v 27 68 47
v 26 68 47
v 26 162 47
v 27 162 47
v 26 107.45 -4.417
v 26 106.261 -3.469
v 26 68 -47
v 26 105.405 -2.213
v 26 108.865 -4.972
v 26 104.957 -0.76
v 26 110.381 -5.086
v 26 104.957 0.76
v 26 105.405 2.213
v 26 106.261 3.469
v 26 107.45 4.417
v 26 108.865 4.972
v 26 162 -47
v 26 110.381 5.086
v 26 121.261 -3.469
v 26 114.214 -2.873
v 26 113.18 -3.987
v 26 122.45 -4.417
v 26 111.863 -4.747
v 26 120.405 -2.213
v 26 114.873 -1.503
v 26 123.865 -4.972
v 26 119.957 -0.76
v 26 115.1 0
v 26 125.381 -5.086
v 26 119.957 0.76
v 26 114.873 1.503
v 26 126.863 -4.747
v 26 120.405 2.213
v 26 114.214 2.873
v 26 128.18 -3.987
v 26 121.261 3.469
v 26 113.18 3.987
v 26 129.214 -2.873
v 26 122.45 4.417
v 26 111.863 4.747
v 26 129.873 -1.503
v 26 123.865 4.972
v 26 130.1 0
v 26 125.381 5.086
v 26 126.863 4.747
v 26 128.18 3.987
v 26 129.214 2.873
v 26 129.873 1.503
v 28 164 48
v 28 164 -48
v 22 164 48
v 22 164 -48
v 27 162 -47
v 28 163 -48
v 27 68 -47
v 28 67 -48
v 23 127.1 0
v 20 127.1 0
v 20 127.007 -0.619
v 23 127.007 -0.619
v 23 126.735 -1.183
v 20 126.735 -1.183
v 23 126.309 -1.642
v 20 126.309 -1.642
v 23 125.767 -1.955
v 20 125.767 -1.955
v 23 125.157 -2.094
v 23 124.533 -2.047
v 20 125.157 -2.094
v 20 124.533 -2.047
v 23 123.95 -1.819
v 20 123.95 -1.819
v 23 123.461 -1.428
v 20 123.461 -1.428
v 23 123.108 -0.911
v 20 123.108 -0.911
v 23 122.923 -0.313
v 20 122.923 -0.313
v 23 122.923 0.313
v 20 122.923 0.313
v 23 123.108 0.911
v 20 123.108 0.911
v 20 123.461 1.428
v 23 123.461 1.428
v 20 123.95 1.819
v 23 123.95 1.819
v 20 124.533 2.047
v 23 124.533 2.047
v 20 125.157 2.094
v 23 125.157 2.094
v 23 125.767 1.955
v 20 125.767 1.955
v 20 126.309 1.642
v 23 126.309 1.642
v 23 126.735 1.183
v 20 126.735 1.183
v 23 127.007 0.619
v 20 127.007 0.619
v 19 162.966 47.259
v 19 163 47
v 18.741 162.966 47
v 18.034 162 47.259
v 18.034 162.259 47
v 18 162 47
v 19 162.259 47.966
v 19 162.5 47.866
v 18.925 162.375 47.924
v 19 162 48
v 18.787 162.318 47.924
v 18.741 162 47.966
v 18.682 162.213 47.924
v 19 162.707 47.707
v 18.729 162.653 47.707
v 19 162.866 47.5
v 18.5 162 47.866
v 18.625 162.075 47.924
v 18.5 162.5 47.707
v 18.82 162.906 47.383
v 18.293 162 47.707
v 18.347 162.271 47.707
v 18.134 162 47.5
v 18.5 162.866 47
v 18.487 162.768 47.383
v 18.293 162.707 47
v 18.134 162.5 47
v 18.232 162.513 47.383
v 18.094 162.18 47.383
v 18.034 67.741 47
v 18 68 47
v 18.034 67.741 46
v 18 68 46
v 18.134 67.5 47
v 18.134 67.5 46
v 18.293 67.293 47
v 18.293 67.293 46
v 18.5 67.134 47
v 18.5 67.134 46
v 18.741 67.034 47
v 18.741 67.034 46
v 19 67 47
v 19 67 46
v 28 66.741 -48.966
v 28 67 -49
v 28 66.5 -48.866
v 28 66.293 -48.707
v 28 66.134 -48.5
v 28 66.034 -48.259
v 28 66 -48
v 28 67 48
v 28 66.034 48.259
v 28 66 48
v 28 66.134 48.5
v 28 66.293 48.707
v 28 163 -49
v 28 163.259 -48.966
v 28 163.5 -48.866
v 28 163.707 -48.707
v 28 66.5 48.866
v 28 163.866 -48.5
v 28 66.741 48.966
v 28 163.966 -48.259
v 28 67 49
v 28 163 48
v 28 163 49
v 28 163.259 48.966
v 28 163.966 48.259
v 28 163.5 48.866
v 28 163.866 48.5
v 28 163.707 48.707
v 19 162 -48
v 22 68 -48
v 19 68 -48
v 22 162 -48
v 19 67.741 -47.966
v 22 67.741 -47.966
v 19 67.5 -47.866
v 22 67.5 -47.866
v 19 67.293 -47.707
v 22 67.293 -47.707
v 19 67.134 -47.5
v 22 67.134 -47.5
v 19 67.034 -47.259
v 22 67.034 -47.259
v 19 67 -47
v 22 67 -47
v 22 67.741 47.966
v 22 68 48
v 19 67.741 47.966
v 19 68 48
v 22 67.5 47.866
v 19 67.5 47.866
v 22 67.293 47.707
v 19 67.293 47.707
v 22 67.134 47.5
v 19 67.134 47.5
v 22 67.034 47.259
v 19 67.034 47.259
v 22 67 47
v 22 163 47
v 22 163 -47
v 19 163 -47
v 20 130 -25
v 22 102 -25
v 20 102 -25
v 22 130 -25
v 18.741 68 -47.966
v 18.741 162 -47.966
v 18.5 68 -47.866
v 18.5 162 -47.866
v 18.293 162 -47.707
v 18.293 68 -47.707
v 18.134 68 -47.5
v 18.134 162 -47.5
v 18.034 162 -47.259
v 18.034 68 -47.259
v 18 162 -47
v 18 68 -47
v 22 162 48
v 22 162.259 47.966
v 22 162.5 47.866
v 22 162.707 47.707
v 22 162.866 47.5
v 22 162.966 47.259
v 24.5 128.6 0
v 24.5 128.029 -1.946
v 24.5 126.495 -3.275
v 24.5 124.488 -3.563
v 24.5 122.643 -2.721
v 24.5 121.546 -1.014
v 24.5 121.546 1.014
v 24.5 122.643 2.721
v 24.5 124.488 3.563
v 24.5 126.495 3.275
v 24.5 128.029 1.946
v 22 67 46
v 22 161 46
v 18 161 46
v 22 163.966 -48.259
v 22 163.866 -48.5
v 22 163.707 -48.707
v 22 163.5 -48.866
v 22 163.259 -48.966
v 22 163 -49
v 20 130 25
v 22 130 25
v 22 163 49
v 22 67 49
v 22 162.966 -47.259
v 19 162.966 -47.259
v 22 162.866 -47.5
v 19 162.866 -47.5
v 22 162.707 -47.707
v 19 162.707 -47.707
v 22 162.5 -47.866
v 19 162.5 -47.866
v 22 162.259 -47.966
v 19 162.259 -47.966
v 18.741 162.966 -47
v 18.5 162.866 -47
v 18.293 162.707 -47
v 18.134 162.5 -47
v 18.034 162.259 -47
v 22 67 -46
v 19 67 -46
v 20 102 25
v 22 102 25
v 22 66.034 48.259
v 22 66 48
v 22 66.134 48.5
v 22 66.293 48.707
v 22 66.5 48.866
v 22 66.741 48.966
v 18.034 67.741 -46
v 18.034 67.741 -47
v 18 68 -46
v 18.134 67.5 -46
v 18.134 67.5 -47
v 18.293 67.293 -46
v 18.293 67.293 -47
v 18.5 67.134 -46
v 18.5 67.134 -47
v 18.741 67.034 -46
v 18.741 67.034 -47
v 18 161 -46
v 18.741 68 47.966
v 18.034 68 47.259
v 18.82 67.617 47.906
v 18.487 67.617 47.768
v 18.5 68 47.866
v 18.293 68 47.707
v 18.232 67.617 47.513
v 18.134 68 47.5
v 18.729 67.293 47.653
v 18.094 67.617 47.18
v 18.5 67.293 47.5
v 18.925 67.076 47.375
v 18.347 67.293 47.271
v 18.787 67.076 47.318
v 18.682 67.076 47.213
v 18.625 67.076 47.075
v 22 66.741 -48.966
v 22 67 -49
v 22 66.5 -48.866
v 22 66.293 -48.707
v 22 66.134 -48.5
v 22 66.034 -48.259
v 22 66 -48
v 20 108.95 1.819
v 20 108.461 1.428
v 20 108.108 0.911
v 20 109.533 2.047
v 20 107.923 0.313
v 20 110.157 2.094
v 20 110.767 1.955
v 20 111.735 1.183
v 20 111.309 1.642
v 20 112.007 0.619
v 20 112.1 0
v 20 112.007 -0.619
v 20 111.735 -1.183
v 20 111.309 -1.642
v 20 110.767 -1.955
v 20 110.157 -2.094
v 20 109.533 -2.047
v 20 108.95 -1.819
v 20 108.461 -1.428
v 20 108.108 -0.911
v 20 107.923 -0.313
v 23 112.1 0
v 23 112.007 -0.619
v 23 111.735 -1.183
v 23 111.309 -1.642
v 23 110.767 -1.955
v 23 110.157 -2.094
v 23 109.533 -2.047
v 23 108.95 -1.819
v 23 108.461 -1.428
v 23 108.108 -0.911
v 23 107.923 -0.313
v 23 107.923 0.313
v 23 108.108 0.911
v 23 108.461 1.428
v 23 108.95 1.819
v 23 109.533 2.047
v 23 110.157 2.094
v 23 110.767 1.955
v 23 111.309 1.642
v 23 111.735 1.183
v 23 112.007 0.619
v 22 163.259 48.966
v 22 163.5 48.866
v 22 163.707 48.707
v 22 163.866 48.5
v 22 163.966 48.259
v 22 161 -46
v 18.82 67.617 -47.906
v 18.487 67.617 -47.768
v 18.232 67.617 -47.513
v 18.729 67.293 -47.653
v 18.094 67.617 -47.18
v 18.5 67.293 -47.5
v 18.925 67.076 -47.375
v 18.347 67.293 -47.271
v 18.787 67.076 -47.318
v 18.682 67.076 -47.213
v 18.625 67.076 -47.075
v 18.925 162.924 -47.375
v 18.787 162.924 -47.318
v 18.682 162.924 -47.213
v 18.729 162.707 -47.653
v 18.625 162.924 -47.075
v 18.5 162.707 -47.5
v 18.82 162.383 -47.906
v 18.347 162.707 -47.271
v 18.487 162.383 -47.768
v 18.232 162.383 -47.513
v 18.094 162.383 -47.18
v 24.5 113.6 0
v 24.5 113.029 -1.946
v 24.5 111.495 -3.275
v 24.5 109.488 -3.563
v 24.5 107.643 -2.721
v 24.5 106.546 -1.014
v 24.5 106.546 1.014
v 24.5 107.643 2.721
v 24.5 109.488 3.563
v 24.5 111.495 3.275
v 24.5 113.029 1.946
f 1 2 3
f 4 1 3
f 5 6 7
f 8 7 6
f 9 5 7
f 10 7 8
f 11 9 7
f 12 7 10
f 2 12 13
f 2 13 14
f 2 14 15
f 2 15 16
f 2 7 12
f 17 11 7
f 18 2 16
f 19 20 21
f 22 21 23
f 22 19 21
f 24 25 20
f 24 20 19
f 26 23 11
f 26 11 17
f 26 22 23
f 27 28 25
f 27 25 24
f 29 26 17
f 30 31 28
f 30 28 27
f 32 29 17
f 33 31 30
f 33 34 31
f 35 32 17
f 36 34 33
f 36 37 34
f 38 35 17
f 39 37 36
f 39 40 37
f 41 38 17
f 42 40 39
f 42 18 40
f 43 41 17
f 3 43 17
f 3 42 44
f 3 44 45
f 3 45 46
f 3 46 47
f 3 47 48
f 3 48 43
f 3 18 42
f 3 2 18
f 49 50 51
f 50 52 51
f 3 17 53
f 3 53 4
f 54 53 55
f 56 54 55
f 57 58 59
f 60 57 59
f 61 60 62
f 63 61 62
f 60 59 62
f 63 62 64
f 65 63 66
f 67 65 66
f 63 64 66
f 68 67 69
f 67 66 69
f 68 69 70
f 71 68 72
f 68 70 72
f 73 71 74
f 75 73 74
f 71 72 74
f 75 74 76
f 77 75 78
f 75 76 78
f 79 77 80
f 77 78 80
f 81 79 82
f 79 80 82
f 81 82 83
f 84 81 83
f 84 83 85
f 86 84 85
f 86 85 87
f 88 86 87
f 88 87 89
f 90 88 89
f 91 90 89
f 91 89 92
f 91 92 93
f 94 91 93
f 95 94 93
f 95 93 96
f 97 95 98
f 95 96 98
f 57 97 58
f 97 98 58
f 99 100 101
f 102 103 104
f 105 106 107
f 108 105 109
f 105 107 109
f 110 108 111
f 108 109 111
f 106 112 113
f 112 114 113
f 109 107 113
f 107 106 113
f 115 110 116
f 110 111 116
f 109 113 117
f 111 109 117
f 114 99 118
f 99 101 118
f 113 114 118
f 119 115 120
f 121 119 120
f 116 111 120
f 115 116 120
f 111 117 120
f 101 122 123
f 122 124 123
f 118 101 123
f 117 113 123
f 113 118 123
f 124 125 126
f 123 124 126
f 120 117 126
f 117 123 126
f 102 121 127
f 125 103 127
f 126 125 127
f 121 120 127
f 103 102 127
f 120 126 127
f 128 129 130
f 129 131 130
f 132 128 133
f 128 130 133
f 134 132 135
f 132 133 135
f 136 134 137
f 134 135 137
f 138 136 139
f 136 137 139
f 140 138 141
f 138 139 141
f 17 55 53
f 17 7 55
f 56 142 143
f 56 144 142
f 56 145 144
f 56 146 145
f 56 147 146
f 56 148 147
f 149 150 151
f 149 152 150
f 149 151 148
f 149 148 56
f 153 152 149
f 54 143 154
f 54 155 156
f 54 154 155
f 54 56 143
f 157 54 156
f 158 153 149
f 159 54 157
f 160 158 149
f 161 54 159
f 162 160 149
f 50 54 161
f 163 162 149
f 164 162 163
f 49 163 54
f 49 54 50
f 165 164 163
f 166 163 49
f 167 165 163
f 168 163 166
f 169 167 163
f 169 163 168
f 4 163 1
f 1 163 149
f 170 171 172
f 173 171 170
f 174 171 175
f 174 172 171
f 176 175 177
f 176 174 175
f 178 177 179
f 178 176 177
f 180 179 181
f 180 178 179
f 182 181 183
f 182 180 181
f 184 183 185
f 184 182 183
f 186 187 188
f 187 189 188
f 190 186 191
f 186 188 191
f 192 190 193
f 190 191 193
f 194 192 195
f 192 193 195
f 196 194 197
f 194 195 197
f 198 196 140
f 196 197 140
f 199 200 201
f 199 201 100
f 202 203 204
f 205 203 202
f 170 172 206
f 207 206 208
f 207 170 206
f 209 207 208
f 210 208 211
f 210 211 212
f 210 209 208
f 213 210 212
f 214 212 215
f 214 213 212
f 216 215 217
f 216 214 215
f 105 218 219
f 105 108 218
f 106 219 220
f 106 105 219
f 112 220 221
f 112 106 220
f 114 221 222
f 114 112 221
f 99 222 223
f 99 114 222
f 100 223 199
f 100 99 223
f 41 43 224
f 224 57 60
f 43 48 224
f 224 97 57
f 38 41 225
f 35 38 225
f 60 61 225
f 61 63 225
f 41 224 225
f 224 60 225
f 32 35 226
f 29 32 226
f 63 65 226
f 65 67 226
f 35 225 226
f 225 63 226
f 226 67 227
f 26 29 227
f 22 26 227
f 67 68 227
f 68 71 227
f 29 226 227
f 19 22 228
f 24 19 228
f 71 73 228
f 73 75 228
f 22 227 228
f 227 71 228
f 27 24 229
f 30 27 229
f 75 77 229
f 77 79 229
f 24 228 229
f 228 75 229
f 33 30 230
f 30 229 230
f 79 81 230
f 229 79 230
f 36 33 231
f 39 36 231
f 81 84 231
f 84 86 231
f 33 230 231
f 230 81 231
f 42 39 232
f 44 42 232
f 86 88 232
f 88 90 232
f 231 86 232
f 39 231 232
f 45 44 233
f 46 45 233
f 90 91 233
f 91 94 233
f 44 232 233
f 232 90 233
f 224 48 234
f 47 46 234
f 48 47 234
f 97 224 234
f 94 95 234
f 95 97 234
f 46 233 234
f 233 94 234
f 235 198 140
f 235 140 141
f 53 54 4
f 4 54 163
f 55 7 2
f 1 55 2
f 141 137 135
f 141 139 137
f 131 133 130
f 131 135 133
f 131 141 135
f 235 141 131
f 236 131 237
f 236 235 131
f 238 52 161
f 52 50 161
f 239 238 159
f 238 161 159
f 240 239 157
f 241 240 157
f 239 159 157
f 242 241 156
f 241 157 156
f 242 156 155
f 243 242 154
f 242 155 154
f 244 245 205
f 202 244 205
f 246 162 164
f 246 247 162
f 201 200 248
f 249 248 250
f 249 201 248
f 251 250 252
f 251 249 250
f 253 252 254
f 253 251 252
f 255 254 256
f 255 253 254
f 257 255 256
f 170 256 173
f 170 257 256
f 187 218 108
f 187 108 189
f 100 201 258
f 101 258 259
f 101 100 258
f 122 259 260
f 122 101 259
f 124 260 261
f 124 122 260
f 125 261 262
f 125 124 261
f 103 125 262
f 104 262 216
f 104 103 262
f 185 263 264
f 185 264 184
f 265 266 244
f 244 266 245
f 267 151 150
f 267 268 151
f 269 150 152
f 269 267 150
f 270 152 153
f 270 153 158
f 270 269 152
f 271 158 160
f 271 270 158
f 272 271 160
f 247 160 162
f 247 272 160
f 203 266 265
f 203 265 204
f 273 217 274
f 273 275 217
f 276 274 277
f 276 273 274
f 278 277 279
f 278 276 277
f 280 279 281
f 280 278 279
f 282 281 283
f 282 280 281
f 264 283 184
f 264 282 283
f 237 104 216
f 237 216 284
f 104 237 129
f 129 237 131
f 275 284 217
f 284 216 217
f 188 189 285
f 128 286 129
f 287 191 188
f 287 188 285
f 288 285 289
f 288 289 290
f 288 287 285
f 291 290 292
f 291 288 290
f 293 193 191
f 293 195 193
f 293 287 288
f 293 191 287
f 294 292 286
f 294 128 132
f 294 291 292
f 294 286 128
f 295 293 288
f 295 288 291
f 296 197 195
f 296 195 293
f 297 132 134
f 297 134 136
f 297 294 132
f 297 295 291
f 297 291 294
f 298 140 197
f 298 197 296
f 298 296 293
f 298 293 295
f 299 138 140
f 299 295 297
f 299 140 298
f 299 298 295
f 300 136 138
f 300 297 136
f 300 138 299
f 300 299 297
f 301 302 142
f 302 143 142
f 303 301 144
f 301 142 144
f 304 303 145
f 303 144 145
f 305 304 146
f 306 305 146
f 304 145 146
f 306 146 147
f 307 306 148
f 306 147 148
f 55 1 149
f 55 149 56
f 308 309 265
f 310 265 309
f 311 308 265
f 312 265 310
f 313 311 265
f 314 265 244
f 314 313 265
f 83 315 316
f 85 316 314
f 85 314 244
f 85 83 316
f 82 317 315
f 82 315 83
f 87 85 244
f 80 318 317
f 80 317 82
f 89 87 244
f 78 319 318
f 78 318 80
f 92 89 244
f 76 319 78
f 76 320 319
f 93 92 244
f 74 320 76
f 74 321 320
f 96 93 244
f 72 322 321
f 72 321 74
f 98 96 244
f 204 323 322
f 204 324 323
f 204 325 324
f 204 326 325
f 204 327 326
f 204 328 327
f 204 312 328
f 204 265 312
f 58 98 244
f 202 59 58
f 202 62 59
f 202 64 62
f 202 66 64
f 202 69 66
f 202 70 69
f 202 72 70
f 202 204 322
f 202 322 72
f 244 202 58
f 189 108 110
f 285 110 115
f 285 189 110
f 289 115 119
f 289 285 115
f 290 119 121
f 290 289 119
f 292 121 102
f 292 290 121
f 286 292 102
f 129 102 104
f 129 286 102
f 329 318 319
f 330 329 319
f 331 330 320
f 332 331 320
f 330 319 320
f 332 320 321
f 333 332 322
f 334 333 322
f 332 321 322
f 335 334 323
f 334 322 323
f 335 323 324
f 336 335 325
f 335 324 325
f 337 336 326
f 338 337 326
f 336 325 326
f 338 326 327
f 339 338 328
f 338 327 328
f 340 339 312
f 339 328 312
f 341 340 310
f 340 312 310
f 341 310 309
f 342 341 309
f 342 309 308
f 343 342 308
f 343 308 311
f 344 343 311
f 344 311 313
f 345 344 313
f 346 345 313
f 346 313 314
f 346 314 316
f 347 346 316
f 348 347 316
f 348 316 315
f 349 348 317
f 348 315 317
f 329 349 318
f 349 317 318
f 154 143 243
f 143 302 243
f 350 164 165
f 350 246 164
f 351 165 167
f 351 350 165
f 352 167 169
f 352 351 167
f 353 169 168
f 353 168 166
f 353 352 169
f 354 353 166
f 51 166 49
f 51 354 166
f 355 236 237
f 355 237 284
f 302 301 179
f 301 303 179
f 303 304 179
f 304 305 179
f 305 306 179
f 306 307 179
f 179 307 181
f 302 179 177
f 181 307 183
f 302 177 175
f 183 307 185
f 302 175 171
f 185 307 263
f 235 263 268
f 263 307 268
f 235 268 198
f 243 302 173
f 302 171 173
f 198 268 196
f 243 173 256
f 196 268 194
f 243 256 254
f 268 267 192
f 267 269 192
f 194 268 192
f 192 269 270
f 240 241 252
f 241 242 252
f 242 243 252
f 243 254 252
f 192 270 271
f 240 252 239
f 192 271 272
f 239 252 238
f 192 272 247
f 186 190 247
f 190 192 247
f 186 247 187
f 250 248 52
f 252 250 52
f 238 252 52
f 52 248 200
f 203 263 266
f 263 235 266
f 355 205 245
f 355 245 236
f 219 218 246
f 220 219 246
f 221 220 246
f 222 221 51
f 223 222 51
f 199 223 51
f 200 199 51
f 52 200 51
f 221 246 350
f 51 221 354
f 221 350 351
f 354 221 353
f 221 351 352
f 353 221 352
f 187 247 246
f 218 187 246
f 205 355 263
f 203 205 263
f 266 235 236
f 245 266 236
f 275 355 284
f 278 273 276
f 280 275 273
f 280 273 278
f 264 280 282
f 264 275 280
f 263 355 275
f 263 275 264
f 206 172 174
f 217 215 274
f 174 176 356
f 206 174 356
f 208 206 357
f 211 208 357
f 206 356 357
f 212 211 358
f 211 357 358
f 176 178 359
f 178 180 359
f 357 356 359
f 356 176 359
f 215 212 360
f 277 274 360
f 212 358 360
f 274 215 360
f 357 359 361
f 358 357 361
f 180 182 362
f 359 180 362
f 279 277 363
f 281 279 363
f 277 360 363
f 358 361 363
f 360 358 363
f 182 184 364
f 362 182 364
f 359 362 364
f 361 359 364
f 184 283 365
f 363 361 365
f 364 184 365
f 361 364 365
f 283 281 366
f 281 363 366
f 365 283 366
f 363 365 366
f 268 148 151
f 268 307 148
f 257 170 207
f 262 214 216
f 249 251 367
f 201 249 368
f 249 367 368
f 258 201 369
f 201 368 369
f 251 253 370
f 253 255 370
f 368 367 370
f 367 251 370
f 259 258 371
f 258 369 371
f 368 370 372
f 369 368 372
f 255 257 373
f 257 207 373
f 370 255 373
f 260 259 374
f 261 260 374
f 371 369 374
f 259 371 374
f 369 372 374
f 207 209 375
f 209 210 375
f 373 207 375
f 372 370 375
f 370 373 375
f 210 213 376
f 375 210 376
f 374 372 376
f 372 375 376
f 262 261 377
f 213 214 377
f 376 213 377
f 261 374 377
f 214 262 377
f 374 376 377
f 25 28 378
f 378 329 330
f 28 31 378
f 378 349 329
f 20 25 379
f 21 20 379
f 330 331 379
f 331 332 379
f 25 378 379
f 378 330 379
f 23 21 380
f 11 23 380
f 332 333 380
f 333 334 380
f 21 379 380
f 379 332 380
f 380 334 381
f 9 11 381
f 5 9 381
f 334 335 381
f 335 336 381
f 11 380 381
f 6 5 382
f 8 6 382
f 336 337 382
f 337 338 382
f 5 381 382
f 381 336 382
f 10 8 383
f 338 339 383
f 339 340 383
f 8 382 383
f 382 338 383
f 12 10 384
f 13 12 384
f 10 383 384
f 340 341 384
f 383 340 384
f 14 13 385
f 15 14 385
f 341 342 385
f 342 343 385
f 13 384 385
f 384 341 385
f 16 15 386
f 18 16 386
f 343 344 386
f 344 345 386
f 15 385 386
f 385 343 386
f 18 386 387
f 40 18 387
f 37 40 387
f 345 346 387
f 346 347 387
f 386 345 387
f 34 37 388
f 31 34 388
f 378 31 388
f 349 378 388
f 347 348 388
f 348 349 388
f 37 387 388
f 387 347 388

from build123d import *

# Parameters (mm, degrees)
SKETCH009_W     = 98
SKETCH009_H     = 98
PAD006_DEPTH    = 4
SKETCH010_W     = 28
SKETCH010_H     = 50
PAD007_DEPTH    = 2
SKETCH011_R     = 2.1
POCKET003_DEPTH = 6
PAD008_DEPTH    = 4
SKETCH013_W     = 98
SKETCH013_H     = 98
SKETCH013_W_2   = 94
SKETCH013_H_2   = 94
PAD009_DEPTH    = 2
CHAMFER002_SIZE = 3
CHAMFER003_SIZE = 3
CHAMFER004_SIZE = 1
CHAMFER005_SIZE = 1
CHAMFER006_SIZE = 1
CHAMFER007_SIZE = 1
FILLET_R        = 1
FILLET001_R     = 1
FILLET002_R     = 1
FILLET003_R     = 1
FILLET004_R     = 1
FILLET005_R     = 1
FILLET006_R     = 1
FILLET007_R     = 1
FILLET008_R     = 1


with BuildPart() as part:
    # Sketch009 → Pad006 (new body)
    with BuildSketch(Plane.YZ.offset(22)):
        with Locations((115, 0)):
            Rectangle(SKETCH009_W, SKETCH009_H)
    extrude(amount=PAD006_DEPTH)

    # Sketch010 (on Face5 of Pad006) → Pad007 (join)
    with BuildSketch(Plane(origin=(22, 0, 0), x_dir=(0, 1, 0), z_dir=(-1, 0, 0))):
        with Locations((116, 0)):
            Rectangle(SKETCH010_W, SKETCH010_H)
    extrude(amount=PAD007_DEPTH)

    # Sketch011 (on Face11 of Pad007) → Pocket003 (cut)
    with BuildSketch(Plane(origin=(20, 0, 0), x_dir=(0, 1, 0), z_dir=(-1, 0, 0))):
        with Locations((125, 0)):
            Circle(SKETCH011_R)
        with Locations((110, 0)):
            Circle(SKETCH011_R)
    extrude(amount=-POCKET003_DEPTH, mode=Mode.SUBTRACT)

    # Sketch012 (on Face4 of Pocket003) → Pad008 (join)
    with BuildSketch(Plane(origin=(22, 0, 0), x_dir=(0, 1, 0), z_dir=(-1, 0, 0))):
        Polygon((163, 48), (163, -48), (67, -48), (67, -46), (161, -46), (161, 46), (67, 46), (67, 48), align=None)
    extrude(amount=PAD008_DEPTH)

    # Sketch013 (on Face5 of Pad008) → Pad009 (join)
    with BuildSketch(Plane.YZ.offset(26)):
        with Locations((115, 0)):
            Rectangle(SKETCH013_W, SKETCH013_H)
        with Locations((115, 0)):
            Rectangle(SKETCH013_W_2, SKETCH013_H_2, mode=Mode.SUBTRACT)
    extrude(amount=PAD009_DEPTH)

    # Chamfer002
    chamfer002_edges = [part.edges().sort_by_distance(p)[0] for p in [
        (26, 107.9, 0),
    ]]
    chamfer(chamfer002_edges, length=CHAMFER002_SIZE)

    # Chamfer003
    chamfer003_edges = [part.edges().sort_by_distance(p)[0] for p in [
        (26, 122.9, 0),
    ]]
    chamfer(chamfer003_edges, length=CHAMFER003_SIZE)

    # Chamfer004
    chamfer004_edges = [part.edges().sort_by_distance(p)[0] for p in [
        (28, 162, 0),
    ]]
    chamfer(chamfer004_edges, length=CHAMFER004_SIZE)

    # Chamfer005
    chamfer005_edges = [part.edges().sort_by_distance(p)[0] for p in [
        (28, 115, 47),
    ]]
    chamfer(chamfer005_edges, length=CHAMFER005_SIZE)

    # Chamfer006
    chamfer006_edges = [part.edges().sort_by_distance(p)[0] for p in [
        (28, 68, 0.5),
    ]]
    chamfer(chamfer006_edges, length=CHAMFER006_SIZE)

    # Chamfer007
    chamfer007_edges = [part.edges().sort_by_distance(p)[0] for p in [
        (28, 115.5, -47),
    ]]
    chamfer(chamfer007_edges, length=CHAMFER007_SIZE)

    # Fillet
    fillet_edges = [part.edges().sort_by_distance(p)[0] for p in [
        (25, 164, -49),
    ]]
    fillet(fillet_edges, radius=FILLET_R)

    # Fillet001
    fillet001_edges = [part.edges().sort_by_distance(p)[0] for p in [
        (25, 66, -49),
    ]]
    fillet(fillet001_edges, radius=FILLET001_R)

    # Fillet002
    fillet002_edges = [part.edges().sort_by_distance(p)[0] for p in [
        (25, 66, 49),
    ]]
    fillet(fillet002_edges, radius=FILLET002_R)

    # Fillet003
    fillet003_edges = [part.edges().sort_by_distance(p)[0] for p in [
        (25, 164, 49),
    ]]
    fillet(fillet003_edges, radius=FILLET003_R)

    # Fillet004
    fillet004_edges = [part.edges().sort_by_distance(p)[0] for p in [
        (18, 115, -48),
    ]]
    fillet(fillet004_edges, radius=FILLET004_R)

    # Fillet005
    fillet005_edges = [part.edges().sort_by_distance(p)[0] for p in [
        (18, 163, 0.5),
    ]]
    fillet(fillet005_edges, radius=FILLET005_R)

    # Fillet006
    fillet006_edges = [part.edges().sort_by_distance(p)[0] for p in [
        (18, 114.5, 48),
    ]]
    fillet(fillet006_edges, radius=FILLET006_R)

    # Fillet007
    fillet007_edges = [part.edges().sort_by_distance(p)[0] for p in [
        (20.5, 67, -48),
    ]]
    fillet(fillet007_edges, radius=FILLET007_R)

    # Fillet008
    fillet008_edges = [part.edges().sort_by_distance(p)[0] for p in [
        (20.5, 67, 48),
    ]]
    fillet(fillet008_edges, radius=FILLET008_R)


solid = part.part
